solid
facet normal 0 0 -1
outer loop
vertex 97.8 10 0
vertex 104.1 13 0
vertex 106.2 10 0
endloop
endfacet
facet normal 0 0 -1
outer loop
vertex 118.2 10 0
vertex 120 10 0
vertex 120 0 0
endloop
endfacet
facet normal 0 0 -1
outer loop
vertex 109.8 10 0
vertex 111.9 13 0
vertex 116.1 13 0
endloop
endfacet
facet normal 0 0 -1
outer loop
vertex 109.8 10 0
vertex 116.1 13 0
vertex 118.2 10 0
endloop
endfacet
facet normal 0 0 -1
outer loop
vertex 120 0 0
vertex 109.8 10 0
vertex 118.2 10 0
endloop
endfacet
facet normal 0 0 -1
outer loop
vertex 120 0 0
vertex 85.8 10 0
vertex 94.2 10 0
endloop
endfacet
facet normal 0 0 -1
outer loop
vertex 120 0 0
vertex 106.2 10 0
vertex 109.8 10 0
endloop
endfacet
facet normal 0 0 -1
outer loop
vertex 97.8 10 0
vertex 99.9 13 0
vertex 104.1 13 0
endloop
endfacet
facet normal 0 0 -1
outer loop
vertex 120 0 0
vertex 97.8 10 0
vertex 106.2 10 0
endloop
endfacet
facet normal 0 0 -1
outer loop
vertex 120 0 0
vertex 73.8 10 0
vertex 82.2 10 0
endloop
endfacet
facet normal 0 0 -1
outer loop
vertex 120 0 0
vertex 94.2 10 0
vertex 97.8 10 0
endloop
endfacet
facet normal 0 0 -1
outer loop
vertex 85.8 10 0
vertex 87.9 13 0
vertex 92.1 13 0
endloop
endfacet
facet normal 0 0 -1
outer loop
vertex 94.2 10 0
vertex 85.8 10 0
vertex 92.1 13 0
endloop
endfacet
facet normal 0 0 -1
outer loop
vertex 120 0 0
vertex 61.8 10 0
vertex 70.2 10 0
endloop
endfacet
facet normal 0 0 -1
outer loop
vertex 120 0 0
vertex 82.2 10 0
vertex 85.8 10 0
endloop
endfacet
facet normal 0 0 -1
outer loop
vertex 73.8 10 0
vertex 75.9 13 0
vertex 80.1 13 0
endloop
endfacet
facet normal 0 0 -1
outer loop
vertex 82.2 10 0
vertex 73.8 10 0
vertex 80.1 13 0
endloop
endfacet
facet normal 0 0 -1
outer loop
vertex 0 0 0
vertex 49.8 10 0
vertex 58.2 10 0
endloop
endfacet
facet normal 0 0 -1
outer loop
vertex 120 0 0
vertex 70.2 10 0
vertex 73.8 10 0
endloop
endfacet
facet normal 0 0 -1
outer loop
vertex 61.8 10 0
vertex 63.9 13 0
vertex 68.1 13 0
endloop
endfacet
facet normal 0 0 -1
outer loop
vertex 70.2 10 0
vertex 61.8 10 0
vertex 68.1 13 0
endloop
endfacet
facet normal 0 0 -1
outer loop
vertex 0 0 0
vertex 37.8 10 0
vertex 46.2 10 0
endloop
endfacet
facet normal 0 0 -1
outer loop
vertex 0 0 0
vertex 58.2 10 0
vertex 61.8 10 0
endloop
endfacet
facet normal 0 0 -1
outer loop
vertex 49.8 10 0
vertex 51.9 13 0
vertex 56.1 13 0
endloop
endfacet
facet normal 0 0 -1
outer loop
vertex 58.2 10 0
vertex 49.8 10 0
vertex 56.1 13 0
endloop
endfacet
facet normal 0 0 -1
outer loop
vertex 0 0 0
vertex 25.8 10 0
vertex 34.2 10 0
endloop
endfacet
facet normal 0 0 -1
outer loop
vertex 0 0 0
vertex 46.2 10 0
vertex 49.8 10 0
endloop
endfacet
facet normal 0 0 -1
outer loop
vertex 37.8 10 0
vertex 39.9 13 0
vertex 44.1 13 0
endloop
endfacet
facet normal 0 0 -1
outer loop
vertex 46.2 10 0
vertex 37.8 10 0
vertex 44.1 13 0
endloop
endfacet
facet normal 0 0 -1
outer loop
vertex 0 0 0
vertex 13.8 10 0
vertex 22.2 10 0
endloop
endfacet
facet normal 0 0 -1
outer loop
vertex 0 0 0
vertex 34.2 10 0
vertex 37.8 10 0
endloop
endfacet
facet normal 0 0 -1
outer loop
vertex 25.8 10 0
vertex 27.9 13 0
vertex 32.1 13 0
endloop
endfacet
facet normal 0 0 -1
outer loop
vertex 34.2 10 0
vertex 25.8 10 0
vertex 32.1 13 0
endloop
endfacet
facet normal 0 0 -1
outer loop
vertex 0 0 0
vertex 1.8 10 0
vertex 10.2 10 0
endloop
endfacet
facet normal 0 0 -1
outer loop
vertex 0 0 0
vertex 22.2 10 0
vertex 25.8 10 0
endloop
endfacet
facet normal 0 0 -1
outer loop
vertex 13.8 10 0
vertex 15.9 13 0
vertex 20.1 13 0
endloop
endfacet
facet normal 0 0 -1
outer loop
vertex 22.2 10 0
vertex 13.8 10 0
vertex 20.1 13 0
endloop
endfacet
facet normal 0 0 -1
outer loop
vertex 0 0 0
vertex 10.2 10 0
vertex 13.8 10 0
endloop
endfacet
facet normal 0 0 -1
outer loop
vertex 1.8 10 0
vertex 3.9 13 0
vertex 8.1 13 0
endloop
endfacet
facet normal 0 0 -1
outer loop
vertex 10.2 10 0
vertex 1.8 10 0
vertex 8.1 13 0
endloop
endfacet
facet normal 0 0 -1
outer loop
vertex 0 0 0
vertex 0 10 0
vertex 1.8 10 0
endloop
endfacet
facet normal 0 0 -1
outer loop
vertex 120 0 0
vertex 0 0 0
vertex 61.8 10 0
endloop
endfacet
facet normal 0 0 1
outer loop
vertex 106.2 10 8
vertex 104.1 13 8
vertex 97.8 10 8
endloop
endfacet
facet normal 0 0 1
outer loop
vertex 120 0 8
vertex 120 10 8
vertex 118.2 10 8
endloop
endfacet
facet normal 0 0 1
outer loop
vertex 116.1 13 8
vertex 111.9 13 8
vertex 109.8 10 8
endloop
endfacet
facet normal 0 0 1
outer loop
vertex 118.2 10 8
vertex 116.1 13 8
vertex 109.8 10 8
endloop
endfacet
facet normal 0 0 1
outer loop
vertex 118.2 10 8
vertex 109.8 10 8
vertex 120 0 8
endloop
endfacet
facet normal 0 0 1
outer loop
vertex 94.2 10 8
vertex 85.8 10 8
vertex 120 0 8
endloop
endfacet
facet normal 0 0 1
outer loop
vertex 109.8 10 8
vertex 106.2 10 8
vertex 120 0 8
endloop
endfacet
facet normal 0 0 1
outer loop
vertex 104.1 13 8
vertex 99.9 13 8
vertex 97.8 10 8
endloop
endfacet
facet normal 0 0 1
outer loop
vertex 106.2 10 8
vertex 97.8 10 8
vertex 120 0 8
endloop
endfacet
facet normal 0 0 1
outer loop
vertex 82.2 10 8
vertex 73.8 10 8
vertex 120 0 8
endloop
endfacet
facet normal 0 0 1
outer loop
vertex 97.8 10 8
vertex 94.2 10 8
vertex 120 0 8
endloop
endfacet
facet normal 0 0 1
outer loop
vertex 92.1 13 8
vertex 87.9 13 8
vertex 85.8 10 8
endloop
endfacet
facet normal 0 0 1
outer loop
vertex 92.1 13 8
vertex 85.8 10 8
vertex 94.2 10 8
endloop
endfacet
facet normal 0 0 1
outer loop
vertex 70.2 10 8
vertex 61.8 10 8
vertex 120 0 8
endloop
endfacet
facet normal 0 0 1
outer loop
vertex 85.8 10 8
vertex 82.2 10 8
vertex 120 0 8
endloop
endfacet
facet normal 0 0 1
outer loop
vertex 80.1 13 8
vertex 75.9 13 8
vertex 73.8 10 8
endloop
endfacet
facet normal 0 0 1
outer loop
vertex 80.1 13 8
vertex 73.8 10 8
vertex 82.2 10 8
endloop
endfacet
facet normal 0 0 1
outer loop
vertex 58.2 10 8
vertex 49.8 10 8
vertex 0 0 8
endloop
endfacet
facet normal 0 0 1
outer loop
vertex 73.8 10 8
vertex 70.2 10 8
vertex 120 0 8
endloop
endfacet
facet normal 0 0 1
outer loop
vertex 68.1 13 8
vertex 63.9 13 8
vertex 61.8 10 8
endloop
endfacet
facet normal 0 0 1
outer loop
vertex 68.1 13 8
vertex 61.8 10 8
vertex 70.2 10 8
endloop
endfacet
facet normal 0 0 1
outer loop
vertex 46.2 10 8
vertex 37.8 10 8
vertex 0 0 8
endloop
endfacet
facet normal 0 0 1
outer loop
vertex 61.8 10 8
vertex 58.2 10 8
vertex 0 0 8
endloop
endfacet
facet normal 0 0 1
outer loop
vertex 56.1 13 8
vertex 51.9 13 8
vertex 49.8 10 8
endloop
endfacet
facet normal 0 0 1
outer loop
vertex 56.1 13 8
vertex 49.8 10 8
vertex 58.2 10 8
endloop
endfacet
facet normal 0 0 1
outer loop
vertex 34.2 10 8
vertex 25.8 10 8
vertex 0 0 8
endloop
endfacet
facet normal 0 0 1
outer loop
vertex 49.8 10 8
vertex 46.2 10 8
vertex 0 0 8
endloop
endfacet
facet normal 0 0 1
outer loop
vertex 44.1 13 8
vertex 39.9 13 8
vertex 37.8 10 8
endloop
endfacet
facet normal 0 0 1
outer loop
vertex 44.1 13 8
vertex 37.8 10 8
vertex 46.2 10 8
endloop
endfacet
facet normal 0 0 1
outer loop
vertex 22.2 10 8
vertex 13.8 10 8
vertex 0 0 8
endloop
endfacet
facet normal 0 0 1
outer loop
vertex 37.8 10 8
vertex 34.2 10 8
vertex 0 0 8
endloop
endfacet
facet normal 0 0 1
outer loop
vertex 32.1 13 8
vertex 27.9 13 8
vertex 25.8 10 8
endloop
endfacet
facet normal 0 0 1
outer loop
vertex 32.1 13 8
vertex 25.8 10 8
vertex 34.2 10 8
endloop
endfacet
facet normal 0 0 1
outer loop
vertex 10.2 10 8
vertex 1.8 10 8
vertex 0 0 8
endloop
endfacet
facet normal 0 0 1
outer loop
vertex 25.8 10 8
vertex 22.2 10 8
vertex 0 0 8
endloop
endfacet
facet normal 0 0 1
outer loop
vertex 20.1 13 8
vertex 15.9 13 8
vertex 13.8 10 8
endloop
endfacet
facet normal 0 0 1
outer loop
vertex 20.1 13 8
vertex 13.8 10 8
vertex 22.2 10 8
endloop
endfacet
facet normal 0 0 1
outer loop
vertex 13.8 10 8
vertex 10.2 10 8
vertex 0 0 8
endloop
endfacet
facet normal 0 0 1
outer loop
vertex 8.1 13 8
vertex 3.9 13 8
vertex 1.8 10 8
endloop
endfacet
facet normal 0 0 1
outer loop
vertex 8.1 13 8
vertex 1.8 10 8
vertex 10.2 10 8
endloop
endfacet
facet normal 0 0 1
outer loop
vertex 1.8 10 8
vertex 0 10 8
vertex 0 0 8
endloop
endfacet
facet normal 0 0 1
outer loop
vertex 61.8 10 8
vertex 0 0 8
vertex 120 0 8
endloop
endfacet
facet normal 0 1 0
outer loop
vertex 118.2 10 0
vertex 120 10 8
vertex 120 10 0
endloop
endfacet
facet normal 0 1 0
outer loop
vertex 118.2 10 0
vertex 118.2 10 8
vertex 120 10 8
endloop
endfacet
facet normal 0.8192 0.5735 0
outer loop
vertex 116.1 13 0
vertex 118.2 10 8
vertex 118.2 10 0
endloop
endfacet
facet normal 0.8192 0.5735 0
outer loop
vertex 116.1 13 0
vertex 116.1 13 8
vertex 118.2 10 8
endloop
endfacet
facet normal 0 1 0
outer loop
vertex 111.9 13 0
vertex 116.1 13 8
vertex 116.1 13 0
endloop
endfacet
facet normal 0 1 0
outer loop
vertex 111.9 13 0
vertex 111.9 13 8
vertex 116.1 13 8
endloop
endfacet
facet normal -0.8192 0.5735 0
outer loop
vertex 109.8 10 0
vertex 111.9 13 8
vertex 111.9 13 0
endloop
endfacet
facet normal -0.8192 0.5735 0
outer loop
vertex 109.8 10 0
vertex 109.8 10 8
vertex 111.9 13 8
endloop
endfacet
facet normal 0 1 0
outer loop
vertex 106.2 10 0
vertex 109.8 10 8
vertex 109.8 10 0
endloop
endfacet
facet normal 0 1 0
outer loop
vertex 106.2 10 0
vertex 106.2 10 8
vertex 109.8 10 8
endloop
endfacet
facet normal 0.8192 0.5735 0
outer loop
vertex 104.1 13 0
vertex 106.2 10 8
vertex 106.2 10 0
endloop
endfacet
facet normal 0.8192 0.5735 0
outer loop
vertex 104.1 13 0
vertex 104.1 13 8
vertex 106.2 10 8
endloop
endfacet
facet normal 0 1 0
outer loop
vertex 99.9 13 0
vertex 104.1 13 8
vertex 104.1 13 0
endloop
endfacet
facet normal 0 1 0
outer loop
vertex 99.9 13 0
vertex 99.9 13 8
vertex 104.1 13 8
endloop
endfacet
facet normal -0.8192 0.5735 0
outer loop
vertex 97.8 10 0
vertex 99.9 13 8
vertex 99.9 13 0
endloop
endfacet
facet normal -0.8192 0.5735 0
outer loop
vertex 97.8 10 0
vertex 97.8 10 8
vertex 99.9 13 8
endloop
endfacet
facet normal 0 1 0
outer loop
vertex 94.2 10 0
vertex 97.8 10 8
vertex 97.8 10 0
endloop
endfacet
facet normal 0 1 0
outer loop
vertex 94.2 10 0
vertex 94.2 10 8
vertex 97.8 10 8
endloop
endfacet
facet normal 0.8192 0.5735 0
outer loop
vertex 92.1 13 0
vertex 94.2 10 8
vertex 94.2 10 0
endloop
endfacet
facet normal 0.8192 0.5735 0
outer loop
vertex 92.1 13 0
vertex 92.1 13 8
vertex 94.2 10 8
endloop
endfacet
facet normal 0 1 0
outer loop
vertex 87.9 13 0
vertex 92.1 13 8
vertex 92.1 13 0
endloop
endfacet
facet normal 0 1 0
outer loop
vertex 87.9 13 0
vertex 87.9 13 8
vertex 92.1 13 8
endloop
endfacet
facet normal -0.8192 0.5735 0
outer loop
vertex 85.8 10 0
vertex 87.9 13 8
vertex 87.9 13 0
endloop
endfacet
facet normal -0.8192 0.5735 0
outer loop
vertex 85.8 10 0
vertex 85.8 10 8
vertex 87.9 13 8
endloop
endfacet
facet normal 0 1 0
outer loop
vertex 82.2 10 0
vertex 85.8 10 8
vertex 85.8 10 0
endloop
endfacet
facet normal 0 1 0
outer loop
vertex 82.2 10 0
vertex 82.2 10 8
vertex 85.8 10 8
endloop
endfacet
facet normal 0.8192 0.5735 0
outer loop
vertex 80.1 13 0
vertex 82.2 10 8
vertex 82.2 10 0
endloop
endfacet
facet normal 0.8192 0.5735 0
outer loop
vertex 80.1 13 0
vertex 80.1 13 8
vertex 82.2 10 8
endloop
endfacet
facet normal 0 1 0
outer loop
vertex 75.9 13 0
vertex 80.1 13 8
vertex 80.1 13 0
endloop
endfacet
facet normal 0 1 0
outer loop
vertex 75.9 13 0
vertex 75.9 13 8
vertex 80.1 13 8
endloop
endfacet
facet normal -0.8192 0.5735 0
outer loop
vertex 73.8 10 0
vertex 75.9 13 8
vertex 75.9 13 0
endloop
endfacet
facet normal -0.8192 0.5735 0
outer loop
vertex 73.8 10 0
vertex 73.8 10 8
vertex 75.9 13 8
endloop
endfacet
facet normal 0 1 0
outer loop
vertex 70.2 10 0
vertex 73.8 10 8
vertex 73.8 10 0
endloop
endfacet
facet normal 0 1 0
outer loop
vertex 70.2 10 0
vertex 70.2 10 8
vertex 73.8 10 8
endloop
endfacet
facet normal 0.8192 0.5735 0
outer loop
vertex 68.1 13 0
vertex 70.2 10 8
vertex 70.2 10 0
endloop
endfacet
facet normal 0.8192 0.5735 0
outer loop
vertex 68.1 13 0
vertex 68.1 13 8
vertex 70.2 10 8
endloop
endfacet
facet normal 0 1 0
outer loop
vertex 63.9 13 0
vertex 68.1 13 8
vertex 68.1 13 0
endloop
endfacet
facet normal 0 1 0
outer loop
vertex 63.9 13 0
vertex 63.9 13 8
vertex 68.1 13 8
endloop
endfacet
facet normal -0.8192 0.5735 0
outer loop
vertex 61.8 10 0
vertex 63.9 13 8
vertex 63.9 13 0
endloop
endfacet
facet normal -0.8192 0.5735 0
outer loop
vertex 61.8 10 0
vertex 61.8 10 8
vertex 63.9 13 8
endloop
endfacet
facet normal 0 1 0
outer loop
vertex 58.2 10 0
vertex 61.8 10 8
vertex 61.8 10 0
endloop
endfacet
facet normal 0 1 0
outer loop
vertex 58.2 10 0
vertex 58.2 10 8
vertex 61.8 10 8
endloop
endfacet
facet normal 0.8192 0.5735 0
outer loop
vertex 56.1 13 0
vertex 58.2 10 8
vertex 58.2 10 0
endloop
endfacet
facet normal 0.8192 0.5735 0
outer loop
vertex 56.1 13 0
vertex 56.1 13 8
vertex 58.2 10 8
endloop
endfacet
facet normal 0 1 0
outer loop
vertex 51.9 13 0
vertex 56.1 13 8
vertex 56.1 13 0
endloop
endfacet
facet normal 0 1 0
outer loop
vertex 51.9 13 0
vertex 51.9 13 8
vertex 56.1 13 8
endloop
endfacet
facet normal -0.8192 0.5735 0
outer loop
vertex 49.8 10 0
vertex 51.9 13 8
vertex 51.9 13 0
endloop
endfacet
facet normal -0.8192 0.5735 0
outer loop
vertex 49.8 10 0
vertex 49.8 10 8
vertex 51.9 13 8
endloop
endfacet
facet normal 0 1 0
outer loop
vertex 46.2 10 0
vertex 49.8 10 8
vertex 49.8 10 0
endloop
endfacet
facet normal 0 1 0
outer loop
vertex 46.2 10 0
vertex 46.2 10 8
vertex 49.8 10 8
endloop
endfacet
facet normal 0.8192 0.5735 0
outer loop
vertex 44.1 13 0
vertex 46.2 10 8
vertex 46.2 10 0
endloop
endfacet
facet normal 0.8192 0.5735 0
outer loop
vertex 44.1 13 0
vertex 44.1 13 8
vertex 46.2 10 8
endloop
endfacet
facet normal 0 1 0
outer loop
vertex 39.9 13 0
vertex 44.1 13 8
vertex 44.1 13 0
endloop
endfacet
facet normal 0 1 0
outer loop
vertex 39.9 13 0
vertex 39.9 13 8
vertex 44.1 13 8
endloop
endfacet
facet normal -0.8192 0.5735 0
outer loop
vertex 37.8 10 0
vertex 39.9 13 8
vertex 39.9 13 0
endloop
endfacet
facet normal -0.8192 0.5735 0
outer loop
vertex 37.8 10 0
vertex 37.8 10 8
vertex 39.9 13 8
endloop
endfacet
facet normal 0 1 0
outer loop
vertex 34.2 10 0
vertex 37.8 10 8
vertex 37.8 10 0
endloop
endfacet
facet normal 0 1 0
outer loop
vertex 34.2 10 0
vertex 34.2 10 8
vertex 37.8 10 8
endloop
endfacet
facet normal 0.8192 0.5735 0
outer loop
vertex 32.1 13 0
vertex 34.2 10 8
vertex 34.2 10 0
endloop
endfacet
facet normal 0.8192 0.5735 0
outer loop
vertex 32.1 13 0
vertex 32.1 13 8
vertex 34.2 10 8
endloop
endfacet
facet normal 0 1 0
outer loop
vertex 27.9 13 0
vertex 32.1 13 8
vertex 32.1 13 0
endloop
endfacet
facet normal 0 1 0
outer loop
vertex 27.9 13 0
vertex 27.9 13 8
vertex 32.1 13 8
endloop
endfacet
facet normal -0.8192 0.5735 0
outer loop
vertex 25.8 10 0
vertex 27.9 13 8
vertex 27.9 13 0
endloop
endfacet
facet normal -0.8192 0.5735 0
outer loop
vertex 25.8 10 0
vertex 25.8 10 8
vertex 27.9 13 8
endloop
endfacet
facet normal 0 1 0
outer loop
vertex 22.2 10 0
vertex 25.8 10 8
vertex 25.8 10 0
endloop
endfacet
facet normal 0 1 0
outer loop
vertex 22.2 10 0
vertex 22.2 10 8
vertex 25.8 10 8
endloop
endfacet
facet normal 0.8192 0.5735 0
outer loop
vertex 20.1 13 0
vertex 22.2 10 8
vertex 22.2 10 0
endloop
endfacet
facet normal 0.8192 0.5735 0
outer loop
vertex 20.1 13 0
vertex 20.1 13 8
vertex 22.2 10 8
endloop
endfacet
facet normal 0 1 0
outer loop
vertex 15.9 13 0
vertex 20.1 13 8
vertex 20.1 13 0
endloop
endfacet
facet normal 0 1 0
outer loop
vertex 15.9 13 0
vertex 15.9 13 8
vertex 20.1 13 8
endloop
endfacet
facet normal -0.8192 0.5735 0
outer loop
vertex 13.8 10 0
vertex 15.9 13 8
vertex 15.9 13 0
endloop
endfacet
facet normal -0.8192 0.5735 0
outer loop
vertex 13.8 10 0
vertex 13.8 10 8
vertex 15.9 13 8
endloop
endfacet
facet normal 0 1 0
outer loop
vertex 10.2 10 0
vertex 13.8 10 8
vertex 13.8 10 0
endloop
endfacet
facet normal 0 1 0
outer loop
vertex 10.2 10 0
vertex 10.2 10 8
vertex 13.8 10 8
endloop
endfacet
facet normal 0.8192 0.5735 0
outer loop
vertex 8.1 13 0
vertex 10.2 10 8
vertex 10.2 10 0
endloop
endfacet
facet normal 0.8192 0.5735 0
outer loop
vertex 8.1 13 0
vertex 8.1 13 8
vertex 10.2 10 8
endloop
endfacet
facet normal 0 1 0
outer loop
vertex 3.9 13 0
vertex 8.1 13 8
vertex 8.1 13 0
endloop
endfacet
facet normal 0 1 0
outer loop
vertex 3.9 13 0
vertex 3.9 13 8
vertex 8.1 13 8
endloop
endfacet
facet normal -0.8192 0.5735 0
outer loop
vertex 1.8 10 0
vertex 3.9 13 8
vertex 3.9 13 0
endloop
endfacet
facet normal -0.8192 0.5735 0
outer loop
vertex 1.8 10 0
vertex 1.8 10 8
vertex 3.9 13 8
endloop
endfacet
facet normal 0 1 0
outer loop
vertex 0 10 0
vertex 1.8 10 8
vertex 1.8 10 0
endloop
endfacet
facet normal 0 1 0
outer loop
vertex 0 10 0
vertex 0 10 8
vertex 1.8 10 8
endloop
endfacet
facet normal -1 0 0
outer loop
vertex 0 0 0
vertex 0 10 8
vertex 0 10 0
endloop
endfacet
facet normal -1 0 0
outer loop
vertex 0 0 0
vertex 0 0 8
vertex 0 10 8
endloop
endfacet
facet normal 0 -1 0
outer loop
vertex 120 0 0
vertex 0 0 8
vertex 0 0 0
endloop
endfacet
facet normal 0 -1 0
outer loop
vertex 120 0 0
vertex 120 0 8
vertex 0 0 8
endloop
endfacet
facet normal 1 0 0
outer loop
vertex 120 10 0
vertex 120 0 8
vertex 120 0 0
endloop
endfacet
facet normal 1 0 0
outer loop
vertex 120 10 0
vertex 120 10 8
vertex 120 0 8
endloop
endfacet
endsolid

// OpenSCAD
$fn = 32;

// ----------------------------------------------------------------------
// Gear rack: 10 teeth, pitch 12 mm
// ----------------------------------------------------------------------

// --- parameters (mm) ---
teeth = 10;               // number of teeth
pitch = 12;               // tooth pitch, X
root_w = 8.4;             // tooth width at the root
tip_w = 4.2;              // tooth width at the tip
base_h = 10;              // rack body height, Y
tooth_h = 3;              // tooth height above the body
plate_t = 8;              // rack width, Z (extrusion height)

rack_l = teeth * pitch;  // overall length
total_h = base_h + tooth_h;  // overall height

profile = [[0, 0], [120, 0], [120, 10], [118.2, 10], [116.1, 13], [111.9, 13], [109.8, 10], [106.2, 10], [104.1, 13], [99.9, 13], [97.8, 10], [94.2, 10], [92.1, 13], [87.9, 13], [85.8, 10], [82.2, 10], [80.1, 13], [75.9, 13], [73.8, 10], [70.2, 10], [68.1, 13], [63.9, 13], [61.8, 10], [58.2, 10], [56.1, 13], [51.9, 13], [49.8, 10], [46.2, 10], [44.1, 13], [39.9, 13], [37.8, 10], [34.2, 10], [32.1, 13], [27.9, 13], [25.8, 10], [22.2, 10], [20.1, 13], [15.9, 13], [13.8, 10], [10.2, 10], [8.1, 13], [3.9, 13], [1.8, 10], [0, 10]];  // primary outline, 44 points, counter clockwise

// --- the one profile operation ---
linear_extrude(height = plate_t) polygon(points = profile);
